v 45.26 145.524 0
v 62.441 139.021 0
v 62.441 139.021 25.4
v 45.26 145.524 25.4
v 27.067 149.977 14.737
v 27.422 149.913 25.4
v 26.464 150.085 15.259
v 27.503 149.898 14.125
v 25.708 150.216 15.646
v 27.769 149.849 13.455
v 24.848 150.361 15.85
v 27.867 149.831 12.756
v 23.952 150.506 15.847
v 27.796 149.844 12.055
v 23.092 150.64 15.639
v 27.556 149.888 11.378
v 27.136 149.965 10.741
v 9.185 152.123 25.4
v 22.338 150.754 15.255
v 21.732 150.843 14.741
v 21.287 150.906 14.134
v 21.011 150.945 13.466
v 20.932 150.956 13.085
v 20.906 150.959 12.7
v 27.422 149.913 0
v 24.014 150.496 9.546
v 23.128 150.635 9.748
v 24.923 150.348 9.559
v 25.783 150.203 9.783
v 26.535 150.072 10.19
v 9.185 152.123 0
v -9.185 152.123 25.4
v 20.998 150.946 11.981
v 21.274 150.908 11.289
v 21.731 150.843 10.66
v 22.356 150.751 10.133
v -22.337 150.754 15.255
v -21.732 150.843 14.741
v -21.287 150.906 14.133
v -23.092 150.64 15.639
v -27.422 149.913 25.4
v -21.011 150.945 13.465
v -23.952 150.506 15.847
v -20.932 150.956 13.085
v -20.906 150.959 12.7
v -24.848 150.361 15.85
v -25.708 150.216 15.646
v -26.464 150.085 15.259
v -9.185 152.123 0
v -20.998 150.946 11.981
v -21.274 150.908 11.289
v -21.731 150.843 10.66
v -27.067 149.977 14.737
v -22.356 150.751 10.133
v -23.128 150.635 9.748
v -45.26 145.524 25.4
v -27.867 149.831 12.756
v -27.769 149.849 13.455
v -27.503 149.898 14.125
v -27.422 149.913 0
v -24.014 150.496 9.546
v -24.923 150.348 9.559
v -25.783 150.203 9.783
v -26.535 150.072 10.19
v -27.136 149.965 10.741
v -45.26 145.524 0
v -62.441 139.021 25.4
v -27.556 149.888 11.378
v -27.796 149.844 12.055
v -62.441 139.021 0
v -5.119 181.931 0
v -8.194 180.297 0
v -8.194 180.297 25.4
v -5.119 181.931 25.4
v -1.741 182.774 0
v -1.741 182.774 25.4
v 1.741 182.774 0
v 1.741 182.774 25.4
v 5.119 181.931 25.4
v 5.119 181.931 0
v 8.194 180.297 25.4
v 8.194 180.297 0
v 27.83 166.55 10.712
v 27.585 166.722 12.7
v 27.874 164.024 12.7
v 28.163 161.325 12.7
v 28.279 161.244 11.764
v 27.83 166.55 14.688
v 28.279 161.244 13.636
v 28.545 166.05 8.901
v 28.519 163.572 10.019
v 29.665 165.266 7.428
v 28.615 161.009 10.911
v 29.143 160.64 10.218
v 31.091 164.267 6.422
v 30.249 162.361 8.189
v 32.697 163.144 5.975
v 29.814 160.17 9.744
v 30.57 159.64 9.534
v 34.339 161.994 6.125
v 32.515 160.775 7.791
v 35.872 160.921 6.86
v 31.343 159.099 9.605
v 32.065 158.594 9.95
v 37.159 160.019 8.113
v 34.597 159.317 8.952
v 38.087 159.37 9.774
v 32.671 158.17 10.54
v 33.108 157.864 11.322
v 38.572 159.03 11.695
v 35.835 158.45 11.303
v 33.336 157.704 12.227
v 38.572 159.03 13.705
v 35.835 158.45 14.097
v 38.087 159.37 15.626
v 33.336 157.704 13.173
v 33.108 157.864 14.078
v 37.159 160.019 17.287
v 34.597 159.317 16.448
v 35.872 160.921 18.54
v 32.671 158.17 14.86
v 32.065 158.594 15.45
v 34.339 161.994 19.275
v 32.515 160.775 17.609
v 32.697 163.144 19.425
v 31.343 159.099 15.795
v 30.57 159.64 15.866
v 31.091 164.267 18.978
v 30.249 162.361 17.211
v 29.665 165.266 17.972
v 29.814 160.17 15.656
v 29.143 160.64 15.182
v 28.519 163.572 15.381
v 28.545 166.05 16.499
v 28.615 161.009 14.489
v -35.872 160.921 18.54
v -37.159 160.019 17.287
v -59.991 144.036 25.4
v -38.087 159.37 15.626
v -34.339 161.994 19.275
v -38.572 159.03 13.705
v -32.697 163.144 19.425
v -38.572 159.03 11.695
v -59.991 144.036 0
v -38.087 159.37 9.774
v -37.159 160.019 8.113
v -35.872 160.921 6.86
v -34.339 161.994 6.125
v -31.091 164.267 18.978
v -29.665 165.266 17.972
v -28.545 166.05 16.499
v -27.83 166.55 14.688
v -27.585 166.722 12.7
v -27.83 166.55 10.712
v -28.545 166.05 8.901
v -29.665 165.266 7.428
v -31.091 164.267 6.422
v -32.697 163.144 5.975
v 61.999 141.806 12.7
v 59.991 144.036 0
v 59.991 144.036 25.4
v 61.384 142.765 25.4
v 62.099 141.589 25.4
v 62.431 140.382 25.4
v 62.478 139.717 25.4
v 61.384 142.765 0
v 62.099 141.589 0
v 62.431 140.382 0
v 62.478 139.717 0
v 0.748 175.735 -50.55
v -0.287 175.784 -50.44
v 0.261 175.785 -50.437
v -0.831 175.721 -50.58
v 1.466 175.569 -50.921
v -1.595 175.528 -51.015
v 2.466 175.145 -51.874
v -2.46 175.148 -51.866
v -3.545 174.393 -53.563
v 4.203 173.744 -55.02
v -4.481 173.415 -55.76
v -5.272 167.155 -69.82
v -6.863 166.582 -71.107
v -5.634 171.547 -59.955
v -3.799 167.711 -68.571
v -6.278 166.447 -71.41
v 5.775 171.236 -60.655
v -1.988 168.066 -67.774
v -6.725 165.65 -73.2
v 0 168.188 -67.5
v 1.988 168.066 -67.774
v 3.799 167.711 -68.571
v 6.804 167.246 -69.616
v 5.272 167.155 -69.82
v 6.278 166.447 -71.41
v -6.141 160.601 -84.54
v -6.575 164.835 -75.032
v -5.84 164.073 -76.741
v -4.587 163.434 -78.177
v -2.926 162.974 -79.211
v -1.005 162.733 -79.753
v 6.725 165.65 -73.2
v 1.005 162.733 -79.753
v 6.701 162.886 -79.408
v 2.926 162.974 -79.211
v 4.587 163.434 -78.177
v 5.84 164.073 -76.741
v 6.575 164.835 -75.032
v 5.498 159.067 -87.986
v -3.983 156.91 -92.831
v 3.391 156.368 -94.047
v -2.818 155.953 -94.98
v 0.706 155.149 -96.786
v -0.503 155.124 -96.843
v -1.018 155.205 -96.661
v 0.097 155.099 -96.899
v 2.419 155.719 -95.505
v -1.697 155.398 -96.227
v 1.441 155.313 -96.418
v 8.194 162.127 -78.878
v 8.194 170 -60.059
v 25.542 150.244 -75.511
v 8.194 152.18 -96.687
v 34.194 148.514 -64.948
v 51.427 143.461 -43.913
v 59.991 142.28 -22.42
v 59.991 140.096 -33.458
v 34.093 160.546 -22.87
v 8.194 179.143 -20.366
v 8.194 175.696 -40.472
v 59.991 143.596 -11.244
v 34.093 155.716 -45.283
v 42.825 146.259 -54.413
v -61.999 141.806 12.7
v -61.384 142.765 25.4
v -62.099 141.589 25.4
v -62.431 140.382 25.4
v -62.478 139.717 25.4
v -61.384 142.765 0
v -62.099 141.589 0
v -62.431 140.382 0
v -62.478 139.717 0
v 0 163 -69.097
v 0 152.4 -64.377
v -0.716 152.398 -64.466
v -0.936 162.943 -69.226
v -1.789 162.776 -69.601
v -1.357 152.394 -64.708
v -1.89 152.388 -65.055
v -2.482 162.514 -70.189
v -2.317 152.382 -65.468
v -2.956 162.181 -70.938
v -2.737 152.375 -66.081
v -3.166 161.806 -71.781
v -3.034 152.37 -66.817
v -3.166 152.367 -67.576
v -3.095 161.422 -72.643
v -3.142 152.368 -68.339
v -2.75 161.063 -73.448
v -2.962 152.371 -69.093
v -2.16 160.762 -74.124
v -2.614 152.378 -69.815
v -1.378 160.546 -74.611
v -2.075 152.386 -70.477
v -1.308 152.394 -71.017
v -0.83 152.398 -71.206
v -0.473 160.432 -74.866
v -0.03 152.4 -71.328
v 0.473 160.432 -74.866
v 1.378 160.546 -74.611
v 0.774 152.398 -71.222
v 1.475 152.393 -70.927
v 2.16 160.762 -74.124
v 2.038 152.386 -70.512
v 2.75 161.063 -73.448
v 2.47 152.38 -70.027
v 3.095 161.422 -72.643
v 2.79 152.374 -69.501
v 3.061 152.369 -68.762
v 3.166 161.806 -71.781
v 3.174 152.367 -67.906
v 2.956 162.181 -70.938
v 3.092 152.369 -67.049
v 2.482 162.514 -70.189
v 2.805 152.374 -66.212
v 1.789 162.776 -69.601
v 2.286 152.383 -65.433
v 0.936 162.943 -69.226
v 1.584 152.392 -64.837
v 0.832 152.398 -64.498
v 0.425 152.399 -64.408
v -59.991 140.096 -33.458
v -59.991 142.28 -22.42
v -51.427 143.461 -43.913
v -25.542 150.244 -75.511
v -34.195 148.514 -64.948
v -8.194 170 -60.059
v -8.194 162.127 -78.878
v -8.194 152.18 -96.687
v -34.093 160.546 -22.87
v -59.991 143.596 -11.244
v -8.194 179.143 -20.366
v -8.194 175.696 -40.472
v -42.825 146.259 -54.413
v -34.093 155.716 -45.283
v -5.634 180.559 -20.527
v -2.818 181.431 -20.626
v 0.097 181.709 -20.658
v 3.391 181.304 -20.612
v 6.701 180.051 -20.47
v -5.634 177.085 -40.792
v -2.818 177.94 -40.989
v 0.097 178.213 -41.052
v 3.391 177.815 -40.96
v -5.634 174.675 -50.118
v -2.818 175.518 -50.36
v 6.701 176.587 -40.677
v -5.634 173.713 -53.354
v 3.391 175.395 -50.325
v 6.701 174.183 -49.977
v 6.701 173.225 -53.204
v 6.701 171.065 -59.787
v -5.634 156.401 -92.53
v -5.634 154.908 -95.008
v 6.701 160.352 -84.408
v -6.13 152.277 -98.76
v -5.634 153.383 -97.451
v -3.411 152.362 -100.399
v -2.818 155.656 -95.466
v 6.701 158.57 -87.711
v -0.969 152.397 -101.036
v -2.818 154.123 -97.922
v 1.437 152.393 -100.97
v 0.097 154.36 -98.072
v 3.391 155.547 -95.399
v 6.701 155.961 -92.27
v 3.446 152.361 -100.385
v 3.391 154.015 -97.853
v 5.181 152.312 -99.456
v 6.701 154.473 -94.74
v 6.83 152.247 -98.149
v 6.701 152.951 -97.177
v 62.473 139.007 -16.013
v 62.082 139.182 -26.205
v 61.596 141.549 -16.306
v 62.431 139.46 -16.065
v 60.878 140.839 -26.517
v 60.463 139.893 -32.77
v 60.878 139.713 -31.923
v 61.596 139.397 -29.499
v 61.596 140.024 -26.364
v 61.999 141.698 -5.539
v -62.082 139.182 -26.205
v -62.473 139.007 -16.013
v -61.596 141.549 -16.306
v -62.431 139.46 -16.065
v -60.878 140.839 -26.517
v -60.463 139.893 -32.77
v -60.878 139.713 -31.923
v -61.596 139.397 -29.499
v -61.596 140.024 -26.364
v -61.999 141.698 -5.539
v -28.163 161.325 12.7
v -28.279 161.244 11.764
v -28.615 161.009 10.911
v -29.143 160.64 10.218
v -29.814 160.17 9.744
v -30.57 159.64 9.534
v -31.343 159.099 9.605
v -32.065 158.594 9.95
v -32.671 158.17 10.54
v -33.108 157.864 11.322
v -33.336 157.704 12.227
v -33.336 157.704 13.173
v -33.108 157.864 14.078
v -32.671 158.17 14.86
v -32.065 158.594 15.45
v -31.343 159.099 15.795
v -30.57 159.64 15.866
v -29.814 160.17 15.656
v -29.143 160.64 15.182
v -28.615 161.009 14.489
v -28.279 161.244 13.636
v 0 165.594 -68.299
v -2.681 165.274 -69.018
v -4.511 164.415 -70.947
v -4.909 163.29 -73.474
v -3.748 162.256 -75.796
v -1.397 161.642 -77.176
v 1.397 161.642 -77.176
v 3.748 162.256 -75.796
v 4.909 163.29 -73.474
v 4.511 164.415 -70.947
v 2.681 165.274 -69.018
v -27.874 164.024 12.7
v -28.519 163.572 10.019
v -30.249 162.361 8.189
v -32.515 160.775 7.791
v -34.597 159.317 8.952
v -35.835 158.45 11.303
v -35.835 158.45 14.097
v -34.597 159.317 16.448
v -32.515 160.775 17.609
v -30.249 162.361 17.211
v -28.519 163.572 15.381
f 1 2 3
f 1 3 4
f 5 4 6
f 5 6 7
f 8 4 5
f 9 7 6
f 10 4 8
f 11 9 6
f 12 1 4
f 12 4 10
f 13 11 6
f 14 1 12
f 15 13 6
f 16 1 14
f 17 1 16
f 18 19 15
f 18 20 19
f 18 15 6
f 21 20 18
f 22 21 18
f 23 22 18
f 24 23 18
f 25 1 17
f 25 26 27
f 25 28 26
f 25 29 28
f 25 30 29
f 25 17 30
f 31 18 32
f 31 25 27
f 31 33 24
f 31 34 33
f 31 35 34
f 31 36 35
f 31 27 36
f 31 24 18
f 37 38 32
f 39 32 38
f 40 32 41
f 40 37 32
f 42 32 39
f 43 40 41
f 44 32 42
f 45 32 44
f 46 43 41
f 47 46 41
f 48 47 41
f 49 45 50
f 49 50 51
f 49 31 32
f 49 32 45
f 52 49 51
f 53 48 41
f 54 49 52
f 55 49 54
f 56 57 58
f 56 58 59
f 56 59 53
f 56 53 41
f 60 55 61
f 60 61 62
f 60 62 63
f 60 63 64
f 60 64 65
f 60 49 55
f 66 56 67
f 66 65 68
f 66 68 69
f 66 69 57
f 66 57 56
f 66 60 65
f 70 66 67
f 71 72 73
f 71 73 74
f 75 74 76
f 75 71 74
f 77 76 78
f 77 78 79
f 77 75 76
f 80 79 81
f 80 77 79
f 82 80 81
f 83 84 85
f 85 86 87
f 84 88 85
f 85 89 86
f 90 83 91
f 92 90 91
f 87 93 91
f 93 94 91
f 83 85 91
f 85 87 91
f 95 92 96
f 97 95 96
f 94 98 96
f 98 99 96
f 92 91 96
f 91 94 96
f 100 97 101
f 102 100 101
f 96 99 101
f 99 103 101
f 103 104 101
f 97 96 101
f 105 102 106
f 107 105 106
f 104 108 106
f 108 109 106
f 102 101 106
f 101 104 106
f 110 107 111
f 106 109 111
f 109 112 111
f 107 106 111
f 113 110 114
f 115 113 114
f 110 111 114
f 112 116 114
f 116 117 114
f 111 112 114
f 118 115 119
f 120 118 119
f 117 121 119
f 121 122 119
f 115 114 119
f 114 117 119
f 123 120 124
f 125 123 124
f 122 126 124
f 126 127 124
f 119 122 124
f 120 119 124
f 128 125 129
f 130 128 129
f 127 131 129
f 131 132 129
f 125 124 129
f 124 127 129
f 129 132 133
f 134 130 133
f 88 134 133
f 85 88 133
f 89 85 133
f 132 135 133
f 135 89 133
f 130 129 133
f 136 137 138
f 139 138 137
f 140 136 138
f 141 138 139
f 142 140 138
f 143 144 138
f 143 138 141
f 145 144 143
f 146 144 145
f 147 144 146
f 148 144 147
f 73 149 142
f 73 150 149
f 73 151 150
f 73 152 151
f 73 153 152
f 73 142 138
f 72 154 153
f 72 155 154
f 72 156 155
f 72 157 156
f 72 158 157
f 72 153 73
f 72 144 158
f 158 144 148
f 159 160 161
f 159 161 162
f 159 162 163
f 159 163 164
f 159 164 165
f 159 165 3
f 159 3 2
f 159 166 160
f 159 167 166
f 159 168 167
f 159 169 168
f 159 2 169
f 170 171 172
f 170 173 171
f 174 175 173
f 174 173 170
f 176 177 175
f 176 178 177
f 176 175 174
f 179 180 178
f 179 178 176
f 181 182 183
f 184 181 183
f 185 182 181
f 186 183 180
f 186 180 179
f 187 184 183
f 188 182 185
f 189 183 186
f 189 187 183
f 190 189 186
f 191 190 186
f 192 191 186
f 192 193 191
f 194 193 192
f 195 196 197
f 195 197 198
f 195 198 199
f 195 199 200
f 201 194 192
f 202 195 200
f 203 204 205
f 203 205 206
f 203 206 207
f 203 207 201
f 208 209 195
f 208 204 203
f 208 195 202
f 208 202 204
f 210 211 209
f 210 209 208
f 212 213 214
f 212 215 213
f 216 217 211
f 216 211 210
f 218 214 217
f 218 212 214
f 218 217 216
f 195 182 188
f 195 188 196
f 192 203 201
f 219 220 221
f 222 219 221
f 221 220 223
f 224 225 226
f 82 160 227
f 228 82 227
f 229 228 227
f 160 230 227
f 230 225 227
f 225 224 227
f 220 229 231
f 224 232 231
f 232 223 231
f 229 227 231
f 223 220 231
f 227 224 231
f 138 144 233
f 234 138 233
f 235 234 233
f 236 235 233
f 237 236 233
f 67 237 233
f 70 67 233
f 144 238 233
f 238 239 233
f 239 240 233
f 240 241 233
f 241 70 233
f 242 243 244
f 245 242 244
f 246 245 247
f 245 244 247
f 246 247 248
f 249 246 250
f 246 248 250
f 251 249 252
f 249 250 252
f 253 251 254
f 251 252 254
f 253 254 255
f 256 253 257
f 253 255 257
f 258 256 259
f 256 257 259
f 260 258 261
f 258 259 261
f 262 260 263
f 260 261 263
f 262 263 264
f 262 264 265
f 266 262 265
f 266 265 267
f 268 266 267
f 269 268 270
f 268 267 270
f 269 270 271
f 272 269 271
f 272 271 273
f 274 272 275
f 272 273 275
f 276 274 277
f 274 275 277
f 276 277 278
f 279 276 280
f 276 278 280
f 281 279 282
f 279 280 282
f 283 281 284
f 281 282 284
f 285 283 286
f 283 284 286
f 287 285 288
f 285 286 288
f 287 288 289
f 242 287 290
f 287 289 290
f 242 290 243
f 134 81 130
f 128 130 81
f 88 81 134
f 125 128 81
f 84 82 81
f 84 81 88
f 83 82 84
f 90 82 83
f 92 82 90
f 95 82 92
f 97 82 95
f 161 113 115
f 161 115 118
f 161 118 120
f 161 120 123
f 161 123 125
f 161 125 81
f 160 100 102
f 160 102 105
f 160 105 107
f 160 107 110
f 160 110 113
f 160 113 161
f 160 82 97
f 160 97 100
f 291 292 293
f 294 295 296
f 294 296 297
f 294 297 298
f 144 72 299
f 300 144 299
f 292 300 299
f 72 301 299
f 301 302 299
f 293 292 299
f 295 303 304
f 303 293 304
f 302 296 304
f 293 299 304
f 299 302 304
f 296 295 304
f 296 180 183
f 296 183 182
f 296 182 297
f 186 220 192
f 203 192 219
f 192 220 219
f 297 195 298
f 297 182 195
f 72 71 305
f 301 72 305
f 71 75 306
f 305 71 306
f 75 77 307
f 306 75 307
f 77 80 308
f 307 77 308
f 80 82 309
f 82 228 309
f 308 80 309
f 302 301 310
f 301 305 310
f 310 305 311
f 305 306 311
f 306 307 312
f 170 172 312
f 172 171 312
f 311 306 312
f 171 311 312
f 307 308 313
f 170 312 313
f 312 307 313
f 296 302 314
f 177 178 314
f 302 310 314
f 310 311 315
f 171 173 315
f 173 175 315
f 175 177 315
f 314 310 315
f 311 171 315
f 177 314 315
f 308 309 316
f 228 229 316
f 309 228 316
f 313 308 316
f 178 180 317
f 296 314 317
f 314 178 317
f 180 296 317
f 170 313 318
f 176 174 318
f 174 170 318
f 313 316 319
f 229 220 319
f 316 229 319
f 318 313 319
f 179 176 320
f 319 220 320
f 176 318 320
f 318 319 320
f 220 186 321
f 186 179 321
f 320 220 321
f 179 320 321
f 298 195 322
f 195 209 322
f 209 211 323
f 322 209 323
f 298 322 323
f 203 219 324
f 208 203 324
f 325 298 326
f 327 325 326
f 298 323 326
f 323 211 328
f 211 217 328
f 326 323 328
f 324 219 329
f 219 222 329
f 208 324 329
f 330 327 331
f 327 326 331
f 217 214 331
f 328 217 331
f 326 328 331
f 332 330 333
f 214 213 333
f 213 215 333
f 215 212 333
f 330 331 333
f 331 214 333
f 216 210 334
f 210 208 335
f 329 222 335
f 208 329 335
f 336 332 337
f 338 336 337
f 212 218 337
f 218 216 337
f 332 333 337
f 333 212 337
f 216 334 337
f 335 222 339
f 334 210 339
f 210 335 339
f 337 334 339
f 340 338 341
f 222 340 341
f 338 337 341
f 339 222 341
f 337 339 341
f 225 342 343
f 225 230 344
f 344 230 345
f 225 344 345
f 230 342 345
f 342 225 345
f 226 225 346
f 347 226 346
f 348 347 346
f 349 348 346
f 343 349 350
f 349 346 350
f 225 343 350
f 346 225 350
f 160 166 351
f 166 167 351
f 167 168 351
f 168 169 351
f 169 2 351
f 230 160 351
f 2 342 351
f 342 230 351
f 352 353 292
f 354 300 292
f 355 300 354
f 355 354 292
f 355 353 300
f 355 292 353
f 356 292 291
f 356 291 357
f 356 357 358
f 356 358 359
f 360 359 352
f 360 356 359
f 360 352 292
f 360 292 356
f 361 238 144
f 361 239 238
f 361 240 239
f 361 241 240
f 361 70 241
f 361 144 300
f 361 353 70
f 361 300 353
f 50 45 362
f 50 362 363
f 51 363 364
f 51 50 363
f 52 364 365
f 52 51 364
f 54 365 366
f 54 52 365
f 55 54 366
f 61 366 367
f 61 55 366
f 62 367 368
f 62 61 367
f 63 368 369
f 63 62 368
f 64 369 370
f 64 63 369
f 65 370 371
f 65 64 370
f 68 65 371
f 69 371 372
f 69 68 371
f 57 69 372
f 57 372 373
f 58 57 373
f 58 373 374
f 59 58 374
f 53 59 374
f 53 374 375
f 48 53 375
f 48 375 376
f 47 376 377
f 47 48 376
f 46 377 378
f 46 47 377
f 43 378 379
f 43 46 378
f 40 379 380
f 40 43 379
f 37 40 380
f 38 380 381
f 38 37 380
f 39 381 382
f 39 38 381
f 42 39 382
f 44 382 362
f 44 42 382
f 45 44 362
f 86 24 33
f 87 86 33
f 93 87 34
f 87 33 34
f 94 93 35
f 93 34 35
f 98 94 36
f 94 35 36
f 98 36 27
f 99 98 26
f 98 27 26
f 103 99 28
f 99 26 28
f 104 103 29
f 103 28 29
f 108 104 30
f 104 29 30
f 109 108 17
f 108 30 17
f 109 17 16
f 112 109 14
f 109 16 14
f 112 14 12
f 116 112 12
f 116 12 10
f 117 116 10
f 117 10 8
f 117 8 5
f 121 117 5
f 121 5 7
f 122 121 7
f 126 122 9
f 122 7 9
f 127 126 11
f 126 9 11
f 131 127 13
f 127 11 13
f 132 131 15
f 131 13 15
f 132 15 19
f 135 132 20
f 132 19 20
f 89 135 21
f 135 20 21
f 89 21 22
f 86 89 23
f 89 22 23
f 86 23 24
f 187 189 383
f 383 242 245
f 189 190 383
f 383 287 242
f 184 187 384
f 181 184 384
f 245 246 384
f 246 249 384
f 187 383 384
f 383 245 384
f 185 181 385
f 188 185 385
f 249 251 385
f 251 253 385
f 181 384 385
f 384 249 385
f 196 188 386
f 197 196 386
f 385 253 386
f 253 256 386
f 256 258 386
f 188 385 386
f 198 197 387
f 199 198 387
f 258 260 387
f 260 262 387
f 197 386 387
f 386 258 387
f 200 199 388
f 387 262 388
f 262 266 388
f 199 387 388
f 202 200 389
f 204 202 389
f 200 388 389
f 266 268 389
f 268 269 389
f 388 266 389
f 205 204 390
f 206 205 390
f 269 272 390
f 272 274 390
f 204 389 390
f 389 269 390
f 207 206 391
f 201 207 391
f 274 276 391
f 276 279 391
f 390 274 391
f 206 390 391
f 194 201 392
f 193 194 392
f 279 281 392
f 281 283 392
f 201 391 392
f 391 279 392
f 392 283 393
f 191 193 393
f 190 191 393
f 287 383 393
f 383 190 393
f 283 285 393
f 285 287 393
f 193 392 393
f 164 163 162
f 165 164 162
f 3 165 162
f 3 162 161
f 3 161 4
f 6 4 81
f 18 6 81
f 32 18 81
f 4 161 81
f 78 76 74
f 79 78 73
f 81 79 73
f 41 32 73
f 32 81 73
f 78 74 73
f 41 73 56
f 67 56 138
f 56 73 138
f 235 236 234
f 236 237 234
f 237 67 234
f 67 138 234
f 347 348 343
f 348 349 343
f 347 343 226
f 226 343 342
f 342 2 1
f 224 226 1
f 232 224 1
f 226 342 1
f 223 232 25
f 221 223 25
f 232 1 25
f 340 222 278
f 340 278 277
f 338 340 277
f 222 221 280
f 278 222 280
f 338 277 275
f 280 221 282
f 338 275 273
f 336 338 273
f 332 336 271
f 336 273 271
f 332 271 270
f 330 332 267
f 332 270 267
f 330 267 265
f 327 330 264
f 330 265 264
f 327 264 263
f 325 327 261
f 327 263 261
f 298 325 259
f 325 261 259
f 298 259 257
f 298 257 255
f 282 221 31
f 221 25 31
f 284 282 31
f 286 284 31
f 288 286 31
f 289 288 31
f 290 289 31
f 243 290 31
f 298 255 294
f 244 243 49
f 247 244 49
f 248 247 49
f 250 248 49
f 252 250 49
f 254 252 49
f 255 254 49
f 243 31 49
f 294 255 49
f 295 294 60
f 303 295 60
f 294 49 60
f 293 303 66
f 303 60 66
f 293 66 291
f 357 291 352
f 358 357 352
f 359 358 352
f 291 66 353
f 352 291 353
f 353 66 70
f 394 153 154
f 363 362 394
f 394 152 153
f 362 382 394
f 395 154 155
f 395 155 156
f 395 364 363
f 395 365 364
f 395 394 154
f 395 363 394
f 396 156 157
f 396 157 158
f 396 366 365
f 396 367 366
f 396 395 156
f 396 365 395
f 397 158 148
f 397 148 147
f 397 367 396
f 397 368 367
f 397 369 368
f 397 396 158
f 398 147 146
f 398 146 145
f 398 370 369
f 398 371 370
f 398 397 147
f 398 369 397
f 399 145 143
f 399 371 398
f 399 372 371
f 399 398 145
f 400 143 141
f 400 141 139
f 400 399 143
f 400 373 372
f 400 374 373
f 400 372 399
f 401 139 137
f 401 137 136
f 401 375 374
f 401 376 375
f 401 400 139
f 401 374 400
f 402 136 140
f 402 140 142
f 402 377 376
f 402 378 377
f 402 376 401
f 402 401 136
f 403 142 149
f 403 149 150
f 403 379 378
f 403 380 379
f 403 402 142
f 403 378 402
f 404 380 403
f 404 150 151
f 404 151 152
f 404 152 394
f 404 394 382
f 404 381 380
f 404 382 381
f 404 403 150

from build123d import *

# Parameters (mm, degrees)
REVOLVE1_ANGLE      = 57
BOSS_EXTRUDE1_DEPTH = 25.4
SKETCH8_R           = 152.4
CUT_EXTRUDE3_DEPTH  = 257.048
SKETCH13_W          = 16.387620484
SKETCH13_H          = 127
CUT_EXTRUDE5_DEPTH  = 1.778


with BuildPart() as part:
    # Sketch1 → Revolve1 (revolve)
    with BuildSketch(Plane.XY):
        with BuildLine():
            Line((-59.991213716, 144.035687339), (-8.193810242, 180.296949153))
            ThreePointArc((-8.193810242, 180.296949153), (0, 182.88), (8.193810242, 180.296949153))
            Line((8.193810242, 180.296949153), (59.991213716, 144.035687339))
            add(Edge.make_bspline(
                [(59.991213716, 144.035687339), (62.78248672, 142.0840471), (62.441206007, 139.021062406)],
                knots=[0, 0, 0, 1, 1, 1], degree=2))
            ThreePointArc((62.441206007, 139.021062406), (0, 152.4), (-62.441206007, 139.021062406))
            add(Edge.make_bspline(
                [(-59.991213716, 144.035687339), (-62.78248672, 142.0840471), (-62.441206007, 139.021062406)],
                knots=[0, 0, 0, 1, 1, 1], degree=2))
        make_face()
    revolve(axis=Axis((0, 0, 0), (-1, 0, 0)), revolution_arc=REVOLVE1_ANGLE)

    # Sketch3 → Boss-Extrude1 (add)
    with BuildSketch(Plane.XY):
        with BuildLine():
            Line((-59.991213716, 144.035687339), (-8.193810242, 180.296949153))
            ThreePointArc((-8.193810242, 180.296949153), (0, 182.88), (8.193810242, 180.296949153))
            Line((8.193810242, 180.296949153), (59.991213716, 144.035687339))
            add(Edge.make_bspline(
                [(59.991213716, 144.035687339), (62.78248672, 142.0840471), (62.441206007, 139.021062406)],
                knots=[0, 0, 0, 1, 1, 1], degree=2))
            ThreePointArc((62.441206007, 139.021062406), (0, 152.4), (-62.441206007, 139.021062406))
            add(Edge.make_bspline(
                [(-59.991213716, 144.035687339), (-62.78248672, 142.0840471), (-62.441206007, 139.021062406)],
                knots=[0, 0, 0, 1, 1, 1], degree=2))
        make_face()
    extrude(amount=BOSS_EXTRUDE1_DEPTH)

    # Sketch7 → Cut-Revolve2 (revolve, cut)
    with BuildSketch(Plane.XY.offset(12.7)):
        Polygon((-18.85509192, 148.029004366), (-21.456080621, 146.208157646), (-33.109499632, 162.854485329), (-27.584999632, 166.721963764), (-28.163260355, 161.325258604), align=None)
    cut_revolve2 = revolve(axis=Axis((-21.456080621, 146.208157646, 12.7), (-0.57349503, 0.81920904, 0)), mode=Mode.SUBTRACT)

    # Mirror2: Cut-Revolve2 across plane
    add(cut_revolve2.mirror(Plane(origin=(0, 0, 0), x_dir=(0, 0, 1), z_dir=(1, 0, 0))), mode=Mode.SUBTRACT)

    # Sketch8 → Cut-Extrude3 (cut)
    with BuildSketch(Plane.XY.offset(25.4)):
        Circle(SKETCH8_R)
    extrude(amount=-CUT_EXTRUDE3_DEPTH, mode=Mode.SUBTRACT)

    # Sketch13 → Cut-Extrude5 (cut)
    with BuildSketch(Plane(origin=(0, 167.069193294, -74.383997286), x_dir=(1, 0, 0), z_dir=(0, 0.913545458, -0.406736643))):
        Rectangle(SKETCH13_W, SKETCH13_H)
    extrude(amount=-CUT_EXTRUDE5_DEPTH, mode=Mode.SUBTRACT)

    # Sketch14 → Cut-Revolve4 (revolve, cut)
    with BuildSketch(Plane(origin=(0, 0, 0), x_dir=(0, 0, -1), z_dir=(1, 0, 0))):
        Polygon((73.660819534, 165.44490947), (67.500143032, 168.18781937), (69.097003878, 163.000445517), (60.429201972, 143.532243688), (63.3297088, 142.240854846), align=None)
    revolve(axis=Axis((0, 165.44490947, -73.660819534), (0, -0.913545458, 0.406736643)), mode=Mode.SUBTRACT)


solid = part.part
